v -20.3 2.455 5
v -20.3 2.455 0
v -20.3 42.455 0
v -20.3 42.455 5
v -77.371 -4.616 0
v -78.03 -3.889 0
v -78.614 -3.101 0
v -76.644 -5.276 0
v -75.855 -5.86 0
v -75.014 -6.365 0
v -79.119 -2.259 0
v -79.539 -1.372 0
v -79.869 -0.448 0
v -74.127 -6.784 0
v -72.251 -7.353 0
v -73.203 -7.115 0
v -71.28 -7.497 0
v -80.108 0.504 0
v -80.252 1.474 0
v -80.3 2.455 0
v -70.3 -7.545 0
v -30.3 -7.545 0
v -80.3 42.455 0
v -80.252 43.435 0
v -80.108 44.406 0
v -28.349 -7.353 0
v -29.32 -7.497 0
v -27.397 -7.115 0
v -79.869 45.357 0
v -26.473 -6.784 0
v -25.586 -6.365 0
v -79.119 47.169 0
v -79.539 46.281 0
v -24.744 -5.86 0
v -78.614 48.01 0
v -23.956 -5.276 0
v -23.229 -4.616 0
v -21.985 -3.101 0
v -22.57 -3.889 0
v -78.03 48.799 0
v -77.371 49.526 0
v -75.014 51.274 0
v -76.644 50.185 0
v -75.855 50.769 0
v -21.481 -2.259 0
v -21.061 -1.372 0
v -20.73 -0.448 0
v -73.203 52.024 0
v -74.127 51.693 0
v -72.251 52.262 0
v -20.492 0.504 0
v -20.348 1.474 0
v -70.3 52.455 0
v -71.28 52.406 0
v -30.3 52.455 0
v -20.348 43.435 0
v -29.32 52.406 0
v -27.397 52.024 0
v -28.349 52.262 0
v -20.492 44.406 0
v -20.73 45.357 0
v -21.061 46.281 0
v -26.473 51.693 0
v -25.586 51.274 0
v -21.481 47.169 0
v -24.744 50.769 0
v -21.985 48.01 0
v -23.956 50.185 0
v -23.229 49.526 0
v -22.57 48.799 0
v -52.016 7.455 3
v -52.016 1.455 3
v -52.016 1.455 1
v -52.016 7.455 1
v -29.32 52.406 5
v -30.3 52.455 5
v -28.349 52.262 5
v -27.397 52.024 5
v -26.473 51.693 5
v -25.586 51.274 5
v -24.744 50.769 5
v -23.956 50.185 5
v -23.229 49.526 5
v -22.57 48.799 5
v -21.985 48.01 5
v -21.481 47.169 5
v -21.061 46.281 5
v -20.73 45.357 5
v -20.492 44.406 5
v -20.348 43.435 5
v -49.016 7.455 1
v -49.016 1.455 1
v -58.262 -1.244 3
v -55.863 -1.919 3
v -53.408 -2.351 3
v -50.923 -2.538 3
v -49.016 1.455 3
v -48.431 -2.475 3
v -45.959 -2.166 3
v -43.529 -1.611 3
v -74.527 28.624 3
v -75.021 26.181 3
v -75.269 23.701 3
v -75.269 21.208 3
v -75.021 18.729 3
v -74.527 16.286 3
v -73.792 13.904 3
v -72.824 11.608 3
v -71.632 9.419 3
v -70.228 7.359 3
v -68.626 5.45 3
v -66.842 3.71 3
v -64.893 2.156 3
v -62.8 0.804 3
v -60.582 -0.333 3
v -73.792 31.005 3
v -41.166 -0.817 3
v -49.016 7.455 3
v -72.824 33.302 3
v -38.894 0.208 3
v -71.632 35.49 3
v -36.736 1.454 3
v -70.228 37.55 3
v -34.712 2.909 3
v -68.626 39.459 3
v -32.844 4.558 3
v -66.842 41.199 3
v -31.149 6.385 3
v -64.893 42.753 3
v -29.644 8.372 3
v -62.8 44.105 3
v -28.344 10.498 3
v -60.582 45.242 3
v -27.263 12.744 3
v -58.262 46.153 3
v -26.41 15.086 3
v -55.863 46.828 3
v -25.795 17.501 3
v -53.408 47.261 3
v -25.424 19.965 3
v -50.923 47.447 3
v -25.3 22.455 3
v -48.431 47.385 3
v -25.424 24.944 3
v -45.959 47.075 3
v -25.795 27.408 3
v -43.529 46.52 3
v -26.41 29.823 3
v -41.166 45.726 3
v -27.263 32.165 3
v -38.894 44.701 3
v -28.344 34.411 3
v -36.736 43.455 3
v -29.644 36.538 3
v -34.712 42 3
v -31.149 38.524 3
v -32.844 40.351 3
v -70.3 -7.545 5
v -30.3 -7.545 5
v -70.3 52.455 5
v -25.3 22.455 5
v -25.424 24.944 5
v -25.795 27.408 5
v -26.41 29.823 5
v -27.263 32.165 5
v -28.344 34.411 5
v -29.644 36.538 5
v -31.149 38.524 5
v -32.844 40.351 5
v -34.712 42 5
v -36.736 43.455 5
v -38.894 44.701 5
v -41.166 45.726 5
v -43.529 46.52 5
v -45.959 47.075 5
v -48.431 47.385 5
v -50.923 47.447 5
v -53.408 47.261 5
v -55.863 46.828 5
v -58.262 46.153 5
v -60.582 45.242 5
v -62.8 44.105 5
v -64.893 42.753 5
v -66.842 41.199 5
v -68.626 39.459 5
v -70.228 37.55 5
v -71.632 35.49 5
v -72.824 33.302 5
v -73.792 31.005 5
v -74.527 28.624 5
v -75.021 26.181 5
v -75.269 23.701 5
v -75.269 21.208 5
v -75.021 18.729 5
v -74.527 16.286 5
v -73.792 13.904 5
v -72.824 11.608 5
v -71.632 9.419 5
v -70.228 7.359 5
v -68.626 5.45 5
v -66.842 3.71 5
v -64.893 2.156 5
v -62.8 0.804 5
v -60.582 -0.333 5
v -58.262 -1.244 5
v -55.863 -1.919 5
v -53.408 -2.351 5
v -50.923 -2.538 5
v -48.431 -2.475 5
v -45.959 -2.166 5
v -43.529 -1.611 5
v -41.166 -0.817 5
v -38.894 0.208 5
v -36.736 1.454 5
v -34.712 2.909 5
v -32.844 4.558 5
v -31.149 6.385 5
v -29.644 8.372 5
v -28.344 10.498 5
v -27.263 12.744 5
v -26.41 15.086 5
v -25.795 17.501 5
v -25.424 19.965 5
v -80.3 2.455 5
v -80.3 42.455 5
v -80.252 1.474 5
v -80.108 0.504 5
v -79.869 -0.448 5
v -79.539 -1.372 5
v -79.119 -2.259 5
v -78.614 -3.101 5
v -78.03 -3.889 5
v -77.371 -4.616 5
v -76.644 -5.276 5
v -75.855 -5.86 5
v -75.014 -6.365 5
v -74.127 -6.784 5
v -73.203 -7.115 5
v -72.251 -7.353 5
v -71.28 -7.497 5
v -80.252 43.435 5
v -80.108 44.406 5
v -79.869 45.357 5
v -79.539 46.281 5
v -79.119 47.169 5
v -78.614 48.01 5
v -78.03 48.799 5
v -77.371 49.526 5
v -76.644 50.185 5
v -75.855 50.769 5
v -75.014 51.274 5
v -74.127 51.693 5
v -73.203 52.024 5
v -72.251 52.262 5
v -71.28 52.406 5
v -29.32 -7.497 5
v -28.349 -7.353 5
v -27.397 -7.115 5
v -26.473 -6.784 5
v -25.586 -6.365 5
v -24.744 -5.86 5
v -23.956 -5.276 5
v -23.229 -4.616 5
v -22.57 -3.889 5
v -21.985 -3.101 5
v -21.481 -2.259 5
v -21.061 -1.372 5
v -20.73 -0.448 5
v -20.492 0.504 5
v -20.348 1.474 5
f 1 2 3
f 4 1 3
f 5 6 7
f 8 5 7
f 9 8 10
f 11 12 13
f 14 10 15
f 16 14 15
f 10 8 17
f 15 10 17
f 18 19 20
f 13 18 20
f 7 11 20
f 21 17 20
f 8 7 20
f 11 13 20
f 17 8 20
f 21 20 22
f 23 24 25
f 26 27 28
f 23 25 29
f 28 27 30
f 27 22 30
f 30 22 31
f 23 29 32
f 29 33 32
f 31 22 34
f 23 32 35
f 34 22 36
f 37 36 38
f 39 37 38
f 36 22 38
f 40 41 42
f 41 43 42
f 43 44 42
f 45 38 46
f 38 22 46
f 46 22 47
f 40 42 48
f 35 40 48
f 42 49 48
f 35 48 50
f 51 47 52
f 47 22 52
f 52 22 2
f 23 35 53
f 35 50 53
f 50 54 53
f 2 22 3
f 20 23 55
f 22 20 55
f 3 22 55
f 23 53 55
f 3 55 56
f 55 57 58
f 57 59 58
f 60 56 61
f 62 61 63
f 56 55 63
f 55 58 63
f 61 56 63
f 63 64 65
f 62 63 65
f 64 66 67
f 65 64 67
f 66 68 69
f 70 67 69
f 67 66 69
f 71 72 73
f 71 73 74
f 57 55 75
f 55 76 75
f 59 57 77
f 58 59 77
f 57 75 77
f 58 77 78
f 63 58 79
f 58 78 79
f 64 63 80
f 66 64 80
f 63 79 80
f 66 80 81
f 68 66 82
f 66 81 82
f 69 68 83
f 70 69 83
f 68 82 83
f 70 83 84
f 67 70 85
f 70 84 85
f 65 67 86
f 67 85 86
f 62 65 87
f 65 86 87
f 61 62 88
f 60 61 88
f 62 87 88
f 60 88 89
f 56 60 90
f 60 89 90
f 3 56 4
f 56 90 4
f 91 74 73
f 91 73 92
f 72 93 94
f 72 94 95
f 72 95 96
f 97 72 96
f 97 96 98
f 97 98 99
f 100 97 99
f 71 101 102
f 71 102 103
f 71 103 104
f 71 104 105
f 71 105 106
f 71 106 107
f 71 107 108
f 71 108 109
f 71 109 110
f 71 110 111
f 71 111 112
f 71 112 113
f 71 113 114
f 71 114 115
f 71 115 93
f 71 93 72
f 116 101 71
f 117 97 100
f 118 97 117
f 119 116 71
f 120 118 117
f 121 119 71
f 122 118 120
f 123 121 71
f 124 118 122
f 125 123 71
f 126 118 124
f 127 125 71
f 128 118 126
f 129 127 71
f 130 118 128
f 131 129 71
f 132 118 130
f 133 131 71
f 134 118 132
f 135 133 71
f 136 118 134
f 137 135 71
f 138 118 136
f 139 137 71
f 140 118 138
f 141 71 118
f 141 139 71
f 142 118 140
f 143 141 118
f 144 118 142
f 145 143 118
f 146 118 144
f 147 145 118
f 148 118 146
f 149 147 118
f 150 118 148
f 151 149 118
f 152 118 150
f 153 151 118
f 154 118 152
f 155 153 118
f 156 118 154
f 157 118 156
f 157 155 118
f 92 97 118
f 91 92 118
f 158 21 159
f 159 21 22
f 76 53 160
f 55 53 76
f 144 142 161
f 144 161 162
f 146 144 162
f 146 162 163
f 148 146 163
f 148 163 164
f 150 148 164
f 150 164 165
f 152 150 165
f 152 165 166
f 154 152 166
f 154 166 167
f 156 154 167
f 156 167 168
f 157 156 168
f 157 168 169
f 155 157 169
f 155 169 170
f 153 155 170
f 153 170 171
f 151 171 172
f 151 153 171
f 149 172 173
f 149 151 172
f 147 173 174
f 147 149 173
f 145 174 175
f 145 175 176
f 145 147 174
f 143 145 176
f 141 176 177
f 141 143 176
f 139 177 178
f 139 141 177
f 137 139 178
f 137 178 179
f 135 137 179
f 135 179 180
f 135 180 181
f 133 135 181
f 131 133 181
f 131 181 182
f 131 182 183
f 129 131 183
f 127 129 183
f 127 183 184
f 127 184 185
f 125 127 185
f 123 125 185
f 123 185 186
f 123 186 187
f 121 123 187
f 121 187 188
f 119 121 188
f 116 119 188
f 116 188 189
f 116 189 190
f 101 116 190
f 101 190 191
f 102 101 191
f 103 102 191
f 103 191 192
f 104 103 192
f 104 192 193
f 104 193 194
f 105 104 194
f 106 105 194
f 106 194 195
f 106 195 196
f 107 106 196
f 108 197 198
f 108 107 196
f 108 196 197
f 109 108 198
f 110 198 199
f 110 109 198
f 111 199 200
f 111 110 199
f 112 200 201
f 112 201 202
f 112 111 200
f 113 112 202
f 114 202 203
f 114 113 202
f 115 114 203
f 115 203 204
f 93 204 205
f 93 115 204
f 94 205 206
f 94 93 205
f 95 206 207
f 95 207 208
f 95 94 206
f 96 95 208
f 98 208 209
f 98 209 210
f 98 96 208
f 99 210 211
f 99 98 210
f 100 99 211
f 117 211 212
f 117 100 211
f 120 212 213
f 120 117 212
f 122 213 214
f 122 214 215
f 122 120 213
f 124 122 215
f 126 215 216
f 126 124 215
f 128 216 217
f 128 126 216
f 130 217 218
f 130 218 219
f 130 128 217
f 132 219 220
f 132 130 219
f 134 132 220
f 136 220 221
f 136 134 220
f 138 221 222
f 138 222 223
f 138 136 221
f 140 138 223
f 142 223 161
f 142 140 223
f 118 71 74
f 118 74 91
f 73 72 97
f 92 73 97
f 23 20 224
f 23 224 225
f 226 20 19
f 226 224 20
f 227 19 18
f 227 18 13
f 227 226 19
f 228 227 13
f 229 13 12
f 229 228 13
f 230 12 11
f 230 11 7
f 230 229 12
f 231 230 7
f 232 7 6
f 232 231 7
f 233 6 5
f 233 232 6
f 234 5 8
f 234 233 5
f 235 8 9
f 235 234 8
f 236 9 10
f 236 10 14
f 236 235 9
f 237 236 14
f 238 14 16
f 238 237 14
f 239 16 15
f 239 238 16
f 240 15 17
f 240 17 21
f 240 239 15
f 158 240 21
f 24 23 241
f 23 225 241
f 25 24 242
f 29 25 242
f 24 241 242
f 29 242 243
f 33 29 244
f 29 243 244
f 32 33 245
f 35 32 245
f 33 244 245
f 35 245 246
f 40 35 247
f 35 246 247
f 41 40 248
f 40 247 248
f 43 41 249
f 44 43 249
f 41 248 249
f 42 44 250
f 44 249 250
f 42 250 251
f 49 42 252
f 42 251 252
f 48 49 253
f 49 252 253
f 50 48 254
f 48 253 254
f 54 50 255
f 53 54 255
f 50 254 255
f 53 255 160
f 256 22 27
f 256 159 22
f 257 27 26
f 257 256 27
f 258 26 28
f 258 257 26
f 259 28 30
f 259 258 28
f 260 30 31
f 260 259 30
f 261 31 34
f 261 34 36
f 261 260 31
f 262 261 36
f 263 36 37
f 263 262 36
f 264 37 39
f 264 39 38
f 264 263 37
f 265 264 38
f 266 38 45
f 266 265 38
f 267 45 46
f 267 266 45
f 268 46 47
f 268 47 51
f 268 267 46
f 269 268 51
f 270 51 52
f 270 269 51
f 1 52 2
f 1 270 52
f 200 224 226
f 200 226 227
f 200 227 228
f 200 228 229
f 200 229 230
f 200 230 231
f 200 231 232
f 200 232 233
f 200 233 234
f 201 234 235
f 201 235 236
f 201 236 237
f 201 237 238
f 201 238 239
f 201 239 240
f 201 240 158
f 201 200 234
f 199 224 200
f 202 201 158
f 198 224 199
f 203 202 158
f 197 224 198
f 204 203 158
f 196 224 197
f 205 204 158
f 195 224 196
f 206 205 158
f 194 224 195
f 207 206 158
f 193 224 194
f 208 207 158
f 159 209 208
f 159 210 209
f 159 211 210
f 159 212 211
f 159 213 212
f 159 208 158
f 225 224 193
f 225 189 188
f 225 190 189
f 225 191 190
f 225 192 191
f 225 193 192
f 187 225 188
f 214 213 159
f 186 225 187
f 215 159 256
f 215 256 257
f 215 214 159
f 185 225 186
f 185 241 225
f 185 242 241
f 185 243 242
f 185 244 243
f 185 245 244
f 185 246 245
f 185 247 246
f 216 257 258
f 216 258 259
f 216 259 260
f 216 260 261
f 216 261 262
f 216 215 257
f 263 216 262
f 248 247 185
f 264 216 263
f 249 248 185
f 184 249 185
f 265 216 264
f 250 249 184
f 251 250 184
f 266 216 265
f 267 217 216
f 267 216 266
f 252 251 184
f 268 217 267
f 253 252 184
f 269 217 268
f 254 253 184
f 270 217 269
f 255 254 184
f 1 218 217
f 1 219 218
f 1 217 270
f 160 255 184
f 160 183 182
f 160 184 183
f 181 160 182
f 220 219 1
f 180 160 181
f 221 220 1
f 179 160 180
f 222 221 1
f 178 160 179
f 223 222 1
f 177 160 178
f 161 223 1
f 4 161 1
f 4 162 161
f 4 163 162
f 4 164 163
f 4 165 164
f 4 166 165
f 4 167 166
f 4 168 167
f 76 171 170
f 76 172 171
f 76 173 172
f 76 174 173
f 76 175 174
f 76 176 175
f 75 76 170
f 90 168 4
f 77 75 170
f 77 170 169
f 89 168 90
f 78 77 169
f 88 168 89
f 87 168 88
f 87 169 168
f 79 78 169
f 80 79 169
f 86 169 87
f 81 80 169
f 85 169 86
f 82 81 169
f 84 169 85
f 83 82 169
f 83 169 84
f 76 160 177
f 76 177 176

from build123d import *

# Parameters (mm, degrees)
F0_W     = 60
F0_H     = 60
F0_R     = 25
F1_DEPTH = 5
F2_DEPTH = 3
F3_R     = 10
F4_W     = 3
F4_H     = 6
F5_DEPTH = 2


with BuildPart() as f1:
    # F0 (on Top) → F1 (new body)
    with BuildSketch(Plane.XY):
        with Locations((-50.299739, 22.454603)):
            Rectangle(F0_W, F0_H)
        with Locations((-50.299739, 22.454603)):
            Circle(F0_R, mode=Mode.SUBTRACT)
    extrude(amount=F1_DEPTH)

    # F0 (on Top) → F2 (join)
    with BuildSketch(Plane.XY):
        with Locations((-50.299739, 22.454603)):
            Circle(F0_R)
    extrude(amount=F2_DEPTH)

    # F3
    f3_edges = [f1.edges().sort_by_distance(p)[0] for p in [
        (-20.299739, -7.545397, 2.5),
        (-80.299739, -7.545397, 2.5),
        (-80.299739, 52.454603, 2.5),
        (-20.299739, 52.454603, 2.5),
    ]]
    fillet(f3_edges, radius=F3_R)

    # F4 (on face) → F5 (cut)
    with BuildSketch(Plane.XY.offset(3)):
        with Locations((-50.516435, 4.454603)):
            Rectangle(F4_W, F4_H)
    extrude(amount=-F5_DEPTH, mode=Mode.SUBTRACT)


solid = f1.part
